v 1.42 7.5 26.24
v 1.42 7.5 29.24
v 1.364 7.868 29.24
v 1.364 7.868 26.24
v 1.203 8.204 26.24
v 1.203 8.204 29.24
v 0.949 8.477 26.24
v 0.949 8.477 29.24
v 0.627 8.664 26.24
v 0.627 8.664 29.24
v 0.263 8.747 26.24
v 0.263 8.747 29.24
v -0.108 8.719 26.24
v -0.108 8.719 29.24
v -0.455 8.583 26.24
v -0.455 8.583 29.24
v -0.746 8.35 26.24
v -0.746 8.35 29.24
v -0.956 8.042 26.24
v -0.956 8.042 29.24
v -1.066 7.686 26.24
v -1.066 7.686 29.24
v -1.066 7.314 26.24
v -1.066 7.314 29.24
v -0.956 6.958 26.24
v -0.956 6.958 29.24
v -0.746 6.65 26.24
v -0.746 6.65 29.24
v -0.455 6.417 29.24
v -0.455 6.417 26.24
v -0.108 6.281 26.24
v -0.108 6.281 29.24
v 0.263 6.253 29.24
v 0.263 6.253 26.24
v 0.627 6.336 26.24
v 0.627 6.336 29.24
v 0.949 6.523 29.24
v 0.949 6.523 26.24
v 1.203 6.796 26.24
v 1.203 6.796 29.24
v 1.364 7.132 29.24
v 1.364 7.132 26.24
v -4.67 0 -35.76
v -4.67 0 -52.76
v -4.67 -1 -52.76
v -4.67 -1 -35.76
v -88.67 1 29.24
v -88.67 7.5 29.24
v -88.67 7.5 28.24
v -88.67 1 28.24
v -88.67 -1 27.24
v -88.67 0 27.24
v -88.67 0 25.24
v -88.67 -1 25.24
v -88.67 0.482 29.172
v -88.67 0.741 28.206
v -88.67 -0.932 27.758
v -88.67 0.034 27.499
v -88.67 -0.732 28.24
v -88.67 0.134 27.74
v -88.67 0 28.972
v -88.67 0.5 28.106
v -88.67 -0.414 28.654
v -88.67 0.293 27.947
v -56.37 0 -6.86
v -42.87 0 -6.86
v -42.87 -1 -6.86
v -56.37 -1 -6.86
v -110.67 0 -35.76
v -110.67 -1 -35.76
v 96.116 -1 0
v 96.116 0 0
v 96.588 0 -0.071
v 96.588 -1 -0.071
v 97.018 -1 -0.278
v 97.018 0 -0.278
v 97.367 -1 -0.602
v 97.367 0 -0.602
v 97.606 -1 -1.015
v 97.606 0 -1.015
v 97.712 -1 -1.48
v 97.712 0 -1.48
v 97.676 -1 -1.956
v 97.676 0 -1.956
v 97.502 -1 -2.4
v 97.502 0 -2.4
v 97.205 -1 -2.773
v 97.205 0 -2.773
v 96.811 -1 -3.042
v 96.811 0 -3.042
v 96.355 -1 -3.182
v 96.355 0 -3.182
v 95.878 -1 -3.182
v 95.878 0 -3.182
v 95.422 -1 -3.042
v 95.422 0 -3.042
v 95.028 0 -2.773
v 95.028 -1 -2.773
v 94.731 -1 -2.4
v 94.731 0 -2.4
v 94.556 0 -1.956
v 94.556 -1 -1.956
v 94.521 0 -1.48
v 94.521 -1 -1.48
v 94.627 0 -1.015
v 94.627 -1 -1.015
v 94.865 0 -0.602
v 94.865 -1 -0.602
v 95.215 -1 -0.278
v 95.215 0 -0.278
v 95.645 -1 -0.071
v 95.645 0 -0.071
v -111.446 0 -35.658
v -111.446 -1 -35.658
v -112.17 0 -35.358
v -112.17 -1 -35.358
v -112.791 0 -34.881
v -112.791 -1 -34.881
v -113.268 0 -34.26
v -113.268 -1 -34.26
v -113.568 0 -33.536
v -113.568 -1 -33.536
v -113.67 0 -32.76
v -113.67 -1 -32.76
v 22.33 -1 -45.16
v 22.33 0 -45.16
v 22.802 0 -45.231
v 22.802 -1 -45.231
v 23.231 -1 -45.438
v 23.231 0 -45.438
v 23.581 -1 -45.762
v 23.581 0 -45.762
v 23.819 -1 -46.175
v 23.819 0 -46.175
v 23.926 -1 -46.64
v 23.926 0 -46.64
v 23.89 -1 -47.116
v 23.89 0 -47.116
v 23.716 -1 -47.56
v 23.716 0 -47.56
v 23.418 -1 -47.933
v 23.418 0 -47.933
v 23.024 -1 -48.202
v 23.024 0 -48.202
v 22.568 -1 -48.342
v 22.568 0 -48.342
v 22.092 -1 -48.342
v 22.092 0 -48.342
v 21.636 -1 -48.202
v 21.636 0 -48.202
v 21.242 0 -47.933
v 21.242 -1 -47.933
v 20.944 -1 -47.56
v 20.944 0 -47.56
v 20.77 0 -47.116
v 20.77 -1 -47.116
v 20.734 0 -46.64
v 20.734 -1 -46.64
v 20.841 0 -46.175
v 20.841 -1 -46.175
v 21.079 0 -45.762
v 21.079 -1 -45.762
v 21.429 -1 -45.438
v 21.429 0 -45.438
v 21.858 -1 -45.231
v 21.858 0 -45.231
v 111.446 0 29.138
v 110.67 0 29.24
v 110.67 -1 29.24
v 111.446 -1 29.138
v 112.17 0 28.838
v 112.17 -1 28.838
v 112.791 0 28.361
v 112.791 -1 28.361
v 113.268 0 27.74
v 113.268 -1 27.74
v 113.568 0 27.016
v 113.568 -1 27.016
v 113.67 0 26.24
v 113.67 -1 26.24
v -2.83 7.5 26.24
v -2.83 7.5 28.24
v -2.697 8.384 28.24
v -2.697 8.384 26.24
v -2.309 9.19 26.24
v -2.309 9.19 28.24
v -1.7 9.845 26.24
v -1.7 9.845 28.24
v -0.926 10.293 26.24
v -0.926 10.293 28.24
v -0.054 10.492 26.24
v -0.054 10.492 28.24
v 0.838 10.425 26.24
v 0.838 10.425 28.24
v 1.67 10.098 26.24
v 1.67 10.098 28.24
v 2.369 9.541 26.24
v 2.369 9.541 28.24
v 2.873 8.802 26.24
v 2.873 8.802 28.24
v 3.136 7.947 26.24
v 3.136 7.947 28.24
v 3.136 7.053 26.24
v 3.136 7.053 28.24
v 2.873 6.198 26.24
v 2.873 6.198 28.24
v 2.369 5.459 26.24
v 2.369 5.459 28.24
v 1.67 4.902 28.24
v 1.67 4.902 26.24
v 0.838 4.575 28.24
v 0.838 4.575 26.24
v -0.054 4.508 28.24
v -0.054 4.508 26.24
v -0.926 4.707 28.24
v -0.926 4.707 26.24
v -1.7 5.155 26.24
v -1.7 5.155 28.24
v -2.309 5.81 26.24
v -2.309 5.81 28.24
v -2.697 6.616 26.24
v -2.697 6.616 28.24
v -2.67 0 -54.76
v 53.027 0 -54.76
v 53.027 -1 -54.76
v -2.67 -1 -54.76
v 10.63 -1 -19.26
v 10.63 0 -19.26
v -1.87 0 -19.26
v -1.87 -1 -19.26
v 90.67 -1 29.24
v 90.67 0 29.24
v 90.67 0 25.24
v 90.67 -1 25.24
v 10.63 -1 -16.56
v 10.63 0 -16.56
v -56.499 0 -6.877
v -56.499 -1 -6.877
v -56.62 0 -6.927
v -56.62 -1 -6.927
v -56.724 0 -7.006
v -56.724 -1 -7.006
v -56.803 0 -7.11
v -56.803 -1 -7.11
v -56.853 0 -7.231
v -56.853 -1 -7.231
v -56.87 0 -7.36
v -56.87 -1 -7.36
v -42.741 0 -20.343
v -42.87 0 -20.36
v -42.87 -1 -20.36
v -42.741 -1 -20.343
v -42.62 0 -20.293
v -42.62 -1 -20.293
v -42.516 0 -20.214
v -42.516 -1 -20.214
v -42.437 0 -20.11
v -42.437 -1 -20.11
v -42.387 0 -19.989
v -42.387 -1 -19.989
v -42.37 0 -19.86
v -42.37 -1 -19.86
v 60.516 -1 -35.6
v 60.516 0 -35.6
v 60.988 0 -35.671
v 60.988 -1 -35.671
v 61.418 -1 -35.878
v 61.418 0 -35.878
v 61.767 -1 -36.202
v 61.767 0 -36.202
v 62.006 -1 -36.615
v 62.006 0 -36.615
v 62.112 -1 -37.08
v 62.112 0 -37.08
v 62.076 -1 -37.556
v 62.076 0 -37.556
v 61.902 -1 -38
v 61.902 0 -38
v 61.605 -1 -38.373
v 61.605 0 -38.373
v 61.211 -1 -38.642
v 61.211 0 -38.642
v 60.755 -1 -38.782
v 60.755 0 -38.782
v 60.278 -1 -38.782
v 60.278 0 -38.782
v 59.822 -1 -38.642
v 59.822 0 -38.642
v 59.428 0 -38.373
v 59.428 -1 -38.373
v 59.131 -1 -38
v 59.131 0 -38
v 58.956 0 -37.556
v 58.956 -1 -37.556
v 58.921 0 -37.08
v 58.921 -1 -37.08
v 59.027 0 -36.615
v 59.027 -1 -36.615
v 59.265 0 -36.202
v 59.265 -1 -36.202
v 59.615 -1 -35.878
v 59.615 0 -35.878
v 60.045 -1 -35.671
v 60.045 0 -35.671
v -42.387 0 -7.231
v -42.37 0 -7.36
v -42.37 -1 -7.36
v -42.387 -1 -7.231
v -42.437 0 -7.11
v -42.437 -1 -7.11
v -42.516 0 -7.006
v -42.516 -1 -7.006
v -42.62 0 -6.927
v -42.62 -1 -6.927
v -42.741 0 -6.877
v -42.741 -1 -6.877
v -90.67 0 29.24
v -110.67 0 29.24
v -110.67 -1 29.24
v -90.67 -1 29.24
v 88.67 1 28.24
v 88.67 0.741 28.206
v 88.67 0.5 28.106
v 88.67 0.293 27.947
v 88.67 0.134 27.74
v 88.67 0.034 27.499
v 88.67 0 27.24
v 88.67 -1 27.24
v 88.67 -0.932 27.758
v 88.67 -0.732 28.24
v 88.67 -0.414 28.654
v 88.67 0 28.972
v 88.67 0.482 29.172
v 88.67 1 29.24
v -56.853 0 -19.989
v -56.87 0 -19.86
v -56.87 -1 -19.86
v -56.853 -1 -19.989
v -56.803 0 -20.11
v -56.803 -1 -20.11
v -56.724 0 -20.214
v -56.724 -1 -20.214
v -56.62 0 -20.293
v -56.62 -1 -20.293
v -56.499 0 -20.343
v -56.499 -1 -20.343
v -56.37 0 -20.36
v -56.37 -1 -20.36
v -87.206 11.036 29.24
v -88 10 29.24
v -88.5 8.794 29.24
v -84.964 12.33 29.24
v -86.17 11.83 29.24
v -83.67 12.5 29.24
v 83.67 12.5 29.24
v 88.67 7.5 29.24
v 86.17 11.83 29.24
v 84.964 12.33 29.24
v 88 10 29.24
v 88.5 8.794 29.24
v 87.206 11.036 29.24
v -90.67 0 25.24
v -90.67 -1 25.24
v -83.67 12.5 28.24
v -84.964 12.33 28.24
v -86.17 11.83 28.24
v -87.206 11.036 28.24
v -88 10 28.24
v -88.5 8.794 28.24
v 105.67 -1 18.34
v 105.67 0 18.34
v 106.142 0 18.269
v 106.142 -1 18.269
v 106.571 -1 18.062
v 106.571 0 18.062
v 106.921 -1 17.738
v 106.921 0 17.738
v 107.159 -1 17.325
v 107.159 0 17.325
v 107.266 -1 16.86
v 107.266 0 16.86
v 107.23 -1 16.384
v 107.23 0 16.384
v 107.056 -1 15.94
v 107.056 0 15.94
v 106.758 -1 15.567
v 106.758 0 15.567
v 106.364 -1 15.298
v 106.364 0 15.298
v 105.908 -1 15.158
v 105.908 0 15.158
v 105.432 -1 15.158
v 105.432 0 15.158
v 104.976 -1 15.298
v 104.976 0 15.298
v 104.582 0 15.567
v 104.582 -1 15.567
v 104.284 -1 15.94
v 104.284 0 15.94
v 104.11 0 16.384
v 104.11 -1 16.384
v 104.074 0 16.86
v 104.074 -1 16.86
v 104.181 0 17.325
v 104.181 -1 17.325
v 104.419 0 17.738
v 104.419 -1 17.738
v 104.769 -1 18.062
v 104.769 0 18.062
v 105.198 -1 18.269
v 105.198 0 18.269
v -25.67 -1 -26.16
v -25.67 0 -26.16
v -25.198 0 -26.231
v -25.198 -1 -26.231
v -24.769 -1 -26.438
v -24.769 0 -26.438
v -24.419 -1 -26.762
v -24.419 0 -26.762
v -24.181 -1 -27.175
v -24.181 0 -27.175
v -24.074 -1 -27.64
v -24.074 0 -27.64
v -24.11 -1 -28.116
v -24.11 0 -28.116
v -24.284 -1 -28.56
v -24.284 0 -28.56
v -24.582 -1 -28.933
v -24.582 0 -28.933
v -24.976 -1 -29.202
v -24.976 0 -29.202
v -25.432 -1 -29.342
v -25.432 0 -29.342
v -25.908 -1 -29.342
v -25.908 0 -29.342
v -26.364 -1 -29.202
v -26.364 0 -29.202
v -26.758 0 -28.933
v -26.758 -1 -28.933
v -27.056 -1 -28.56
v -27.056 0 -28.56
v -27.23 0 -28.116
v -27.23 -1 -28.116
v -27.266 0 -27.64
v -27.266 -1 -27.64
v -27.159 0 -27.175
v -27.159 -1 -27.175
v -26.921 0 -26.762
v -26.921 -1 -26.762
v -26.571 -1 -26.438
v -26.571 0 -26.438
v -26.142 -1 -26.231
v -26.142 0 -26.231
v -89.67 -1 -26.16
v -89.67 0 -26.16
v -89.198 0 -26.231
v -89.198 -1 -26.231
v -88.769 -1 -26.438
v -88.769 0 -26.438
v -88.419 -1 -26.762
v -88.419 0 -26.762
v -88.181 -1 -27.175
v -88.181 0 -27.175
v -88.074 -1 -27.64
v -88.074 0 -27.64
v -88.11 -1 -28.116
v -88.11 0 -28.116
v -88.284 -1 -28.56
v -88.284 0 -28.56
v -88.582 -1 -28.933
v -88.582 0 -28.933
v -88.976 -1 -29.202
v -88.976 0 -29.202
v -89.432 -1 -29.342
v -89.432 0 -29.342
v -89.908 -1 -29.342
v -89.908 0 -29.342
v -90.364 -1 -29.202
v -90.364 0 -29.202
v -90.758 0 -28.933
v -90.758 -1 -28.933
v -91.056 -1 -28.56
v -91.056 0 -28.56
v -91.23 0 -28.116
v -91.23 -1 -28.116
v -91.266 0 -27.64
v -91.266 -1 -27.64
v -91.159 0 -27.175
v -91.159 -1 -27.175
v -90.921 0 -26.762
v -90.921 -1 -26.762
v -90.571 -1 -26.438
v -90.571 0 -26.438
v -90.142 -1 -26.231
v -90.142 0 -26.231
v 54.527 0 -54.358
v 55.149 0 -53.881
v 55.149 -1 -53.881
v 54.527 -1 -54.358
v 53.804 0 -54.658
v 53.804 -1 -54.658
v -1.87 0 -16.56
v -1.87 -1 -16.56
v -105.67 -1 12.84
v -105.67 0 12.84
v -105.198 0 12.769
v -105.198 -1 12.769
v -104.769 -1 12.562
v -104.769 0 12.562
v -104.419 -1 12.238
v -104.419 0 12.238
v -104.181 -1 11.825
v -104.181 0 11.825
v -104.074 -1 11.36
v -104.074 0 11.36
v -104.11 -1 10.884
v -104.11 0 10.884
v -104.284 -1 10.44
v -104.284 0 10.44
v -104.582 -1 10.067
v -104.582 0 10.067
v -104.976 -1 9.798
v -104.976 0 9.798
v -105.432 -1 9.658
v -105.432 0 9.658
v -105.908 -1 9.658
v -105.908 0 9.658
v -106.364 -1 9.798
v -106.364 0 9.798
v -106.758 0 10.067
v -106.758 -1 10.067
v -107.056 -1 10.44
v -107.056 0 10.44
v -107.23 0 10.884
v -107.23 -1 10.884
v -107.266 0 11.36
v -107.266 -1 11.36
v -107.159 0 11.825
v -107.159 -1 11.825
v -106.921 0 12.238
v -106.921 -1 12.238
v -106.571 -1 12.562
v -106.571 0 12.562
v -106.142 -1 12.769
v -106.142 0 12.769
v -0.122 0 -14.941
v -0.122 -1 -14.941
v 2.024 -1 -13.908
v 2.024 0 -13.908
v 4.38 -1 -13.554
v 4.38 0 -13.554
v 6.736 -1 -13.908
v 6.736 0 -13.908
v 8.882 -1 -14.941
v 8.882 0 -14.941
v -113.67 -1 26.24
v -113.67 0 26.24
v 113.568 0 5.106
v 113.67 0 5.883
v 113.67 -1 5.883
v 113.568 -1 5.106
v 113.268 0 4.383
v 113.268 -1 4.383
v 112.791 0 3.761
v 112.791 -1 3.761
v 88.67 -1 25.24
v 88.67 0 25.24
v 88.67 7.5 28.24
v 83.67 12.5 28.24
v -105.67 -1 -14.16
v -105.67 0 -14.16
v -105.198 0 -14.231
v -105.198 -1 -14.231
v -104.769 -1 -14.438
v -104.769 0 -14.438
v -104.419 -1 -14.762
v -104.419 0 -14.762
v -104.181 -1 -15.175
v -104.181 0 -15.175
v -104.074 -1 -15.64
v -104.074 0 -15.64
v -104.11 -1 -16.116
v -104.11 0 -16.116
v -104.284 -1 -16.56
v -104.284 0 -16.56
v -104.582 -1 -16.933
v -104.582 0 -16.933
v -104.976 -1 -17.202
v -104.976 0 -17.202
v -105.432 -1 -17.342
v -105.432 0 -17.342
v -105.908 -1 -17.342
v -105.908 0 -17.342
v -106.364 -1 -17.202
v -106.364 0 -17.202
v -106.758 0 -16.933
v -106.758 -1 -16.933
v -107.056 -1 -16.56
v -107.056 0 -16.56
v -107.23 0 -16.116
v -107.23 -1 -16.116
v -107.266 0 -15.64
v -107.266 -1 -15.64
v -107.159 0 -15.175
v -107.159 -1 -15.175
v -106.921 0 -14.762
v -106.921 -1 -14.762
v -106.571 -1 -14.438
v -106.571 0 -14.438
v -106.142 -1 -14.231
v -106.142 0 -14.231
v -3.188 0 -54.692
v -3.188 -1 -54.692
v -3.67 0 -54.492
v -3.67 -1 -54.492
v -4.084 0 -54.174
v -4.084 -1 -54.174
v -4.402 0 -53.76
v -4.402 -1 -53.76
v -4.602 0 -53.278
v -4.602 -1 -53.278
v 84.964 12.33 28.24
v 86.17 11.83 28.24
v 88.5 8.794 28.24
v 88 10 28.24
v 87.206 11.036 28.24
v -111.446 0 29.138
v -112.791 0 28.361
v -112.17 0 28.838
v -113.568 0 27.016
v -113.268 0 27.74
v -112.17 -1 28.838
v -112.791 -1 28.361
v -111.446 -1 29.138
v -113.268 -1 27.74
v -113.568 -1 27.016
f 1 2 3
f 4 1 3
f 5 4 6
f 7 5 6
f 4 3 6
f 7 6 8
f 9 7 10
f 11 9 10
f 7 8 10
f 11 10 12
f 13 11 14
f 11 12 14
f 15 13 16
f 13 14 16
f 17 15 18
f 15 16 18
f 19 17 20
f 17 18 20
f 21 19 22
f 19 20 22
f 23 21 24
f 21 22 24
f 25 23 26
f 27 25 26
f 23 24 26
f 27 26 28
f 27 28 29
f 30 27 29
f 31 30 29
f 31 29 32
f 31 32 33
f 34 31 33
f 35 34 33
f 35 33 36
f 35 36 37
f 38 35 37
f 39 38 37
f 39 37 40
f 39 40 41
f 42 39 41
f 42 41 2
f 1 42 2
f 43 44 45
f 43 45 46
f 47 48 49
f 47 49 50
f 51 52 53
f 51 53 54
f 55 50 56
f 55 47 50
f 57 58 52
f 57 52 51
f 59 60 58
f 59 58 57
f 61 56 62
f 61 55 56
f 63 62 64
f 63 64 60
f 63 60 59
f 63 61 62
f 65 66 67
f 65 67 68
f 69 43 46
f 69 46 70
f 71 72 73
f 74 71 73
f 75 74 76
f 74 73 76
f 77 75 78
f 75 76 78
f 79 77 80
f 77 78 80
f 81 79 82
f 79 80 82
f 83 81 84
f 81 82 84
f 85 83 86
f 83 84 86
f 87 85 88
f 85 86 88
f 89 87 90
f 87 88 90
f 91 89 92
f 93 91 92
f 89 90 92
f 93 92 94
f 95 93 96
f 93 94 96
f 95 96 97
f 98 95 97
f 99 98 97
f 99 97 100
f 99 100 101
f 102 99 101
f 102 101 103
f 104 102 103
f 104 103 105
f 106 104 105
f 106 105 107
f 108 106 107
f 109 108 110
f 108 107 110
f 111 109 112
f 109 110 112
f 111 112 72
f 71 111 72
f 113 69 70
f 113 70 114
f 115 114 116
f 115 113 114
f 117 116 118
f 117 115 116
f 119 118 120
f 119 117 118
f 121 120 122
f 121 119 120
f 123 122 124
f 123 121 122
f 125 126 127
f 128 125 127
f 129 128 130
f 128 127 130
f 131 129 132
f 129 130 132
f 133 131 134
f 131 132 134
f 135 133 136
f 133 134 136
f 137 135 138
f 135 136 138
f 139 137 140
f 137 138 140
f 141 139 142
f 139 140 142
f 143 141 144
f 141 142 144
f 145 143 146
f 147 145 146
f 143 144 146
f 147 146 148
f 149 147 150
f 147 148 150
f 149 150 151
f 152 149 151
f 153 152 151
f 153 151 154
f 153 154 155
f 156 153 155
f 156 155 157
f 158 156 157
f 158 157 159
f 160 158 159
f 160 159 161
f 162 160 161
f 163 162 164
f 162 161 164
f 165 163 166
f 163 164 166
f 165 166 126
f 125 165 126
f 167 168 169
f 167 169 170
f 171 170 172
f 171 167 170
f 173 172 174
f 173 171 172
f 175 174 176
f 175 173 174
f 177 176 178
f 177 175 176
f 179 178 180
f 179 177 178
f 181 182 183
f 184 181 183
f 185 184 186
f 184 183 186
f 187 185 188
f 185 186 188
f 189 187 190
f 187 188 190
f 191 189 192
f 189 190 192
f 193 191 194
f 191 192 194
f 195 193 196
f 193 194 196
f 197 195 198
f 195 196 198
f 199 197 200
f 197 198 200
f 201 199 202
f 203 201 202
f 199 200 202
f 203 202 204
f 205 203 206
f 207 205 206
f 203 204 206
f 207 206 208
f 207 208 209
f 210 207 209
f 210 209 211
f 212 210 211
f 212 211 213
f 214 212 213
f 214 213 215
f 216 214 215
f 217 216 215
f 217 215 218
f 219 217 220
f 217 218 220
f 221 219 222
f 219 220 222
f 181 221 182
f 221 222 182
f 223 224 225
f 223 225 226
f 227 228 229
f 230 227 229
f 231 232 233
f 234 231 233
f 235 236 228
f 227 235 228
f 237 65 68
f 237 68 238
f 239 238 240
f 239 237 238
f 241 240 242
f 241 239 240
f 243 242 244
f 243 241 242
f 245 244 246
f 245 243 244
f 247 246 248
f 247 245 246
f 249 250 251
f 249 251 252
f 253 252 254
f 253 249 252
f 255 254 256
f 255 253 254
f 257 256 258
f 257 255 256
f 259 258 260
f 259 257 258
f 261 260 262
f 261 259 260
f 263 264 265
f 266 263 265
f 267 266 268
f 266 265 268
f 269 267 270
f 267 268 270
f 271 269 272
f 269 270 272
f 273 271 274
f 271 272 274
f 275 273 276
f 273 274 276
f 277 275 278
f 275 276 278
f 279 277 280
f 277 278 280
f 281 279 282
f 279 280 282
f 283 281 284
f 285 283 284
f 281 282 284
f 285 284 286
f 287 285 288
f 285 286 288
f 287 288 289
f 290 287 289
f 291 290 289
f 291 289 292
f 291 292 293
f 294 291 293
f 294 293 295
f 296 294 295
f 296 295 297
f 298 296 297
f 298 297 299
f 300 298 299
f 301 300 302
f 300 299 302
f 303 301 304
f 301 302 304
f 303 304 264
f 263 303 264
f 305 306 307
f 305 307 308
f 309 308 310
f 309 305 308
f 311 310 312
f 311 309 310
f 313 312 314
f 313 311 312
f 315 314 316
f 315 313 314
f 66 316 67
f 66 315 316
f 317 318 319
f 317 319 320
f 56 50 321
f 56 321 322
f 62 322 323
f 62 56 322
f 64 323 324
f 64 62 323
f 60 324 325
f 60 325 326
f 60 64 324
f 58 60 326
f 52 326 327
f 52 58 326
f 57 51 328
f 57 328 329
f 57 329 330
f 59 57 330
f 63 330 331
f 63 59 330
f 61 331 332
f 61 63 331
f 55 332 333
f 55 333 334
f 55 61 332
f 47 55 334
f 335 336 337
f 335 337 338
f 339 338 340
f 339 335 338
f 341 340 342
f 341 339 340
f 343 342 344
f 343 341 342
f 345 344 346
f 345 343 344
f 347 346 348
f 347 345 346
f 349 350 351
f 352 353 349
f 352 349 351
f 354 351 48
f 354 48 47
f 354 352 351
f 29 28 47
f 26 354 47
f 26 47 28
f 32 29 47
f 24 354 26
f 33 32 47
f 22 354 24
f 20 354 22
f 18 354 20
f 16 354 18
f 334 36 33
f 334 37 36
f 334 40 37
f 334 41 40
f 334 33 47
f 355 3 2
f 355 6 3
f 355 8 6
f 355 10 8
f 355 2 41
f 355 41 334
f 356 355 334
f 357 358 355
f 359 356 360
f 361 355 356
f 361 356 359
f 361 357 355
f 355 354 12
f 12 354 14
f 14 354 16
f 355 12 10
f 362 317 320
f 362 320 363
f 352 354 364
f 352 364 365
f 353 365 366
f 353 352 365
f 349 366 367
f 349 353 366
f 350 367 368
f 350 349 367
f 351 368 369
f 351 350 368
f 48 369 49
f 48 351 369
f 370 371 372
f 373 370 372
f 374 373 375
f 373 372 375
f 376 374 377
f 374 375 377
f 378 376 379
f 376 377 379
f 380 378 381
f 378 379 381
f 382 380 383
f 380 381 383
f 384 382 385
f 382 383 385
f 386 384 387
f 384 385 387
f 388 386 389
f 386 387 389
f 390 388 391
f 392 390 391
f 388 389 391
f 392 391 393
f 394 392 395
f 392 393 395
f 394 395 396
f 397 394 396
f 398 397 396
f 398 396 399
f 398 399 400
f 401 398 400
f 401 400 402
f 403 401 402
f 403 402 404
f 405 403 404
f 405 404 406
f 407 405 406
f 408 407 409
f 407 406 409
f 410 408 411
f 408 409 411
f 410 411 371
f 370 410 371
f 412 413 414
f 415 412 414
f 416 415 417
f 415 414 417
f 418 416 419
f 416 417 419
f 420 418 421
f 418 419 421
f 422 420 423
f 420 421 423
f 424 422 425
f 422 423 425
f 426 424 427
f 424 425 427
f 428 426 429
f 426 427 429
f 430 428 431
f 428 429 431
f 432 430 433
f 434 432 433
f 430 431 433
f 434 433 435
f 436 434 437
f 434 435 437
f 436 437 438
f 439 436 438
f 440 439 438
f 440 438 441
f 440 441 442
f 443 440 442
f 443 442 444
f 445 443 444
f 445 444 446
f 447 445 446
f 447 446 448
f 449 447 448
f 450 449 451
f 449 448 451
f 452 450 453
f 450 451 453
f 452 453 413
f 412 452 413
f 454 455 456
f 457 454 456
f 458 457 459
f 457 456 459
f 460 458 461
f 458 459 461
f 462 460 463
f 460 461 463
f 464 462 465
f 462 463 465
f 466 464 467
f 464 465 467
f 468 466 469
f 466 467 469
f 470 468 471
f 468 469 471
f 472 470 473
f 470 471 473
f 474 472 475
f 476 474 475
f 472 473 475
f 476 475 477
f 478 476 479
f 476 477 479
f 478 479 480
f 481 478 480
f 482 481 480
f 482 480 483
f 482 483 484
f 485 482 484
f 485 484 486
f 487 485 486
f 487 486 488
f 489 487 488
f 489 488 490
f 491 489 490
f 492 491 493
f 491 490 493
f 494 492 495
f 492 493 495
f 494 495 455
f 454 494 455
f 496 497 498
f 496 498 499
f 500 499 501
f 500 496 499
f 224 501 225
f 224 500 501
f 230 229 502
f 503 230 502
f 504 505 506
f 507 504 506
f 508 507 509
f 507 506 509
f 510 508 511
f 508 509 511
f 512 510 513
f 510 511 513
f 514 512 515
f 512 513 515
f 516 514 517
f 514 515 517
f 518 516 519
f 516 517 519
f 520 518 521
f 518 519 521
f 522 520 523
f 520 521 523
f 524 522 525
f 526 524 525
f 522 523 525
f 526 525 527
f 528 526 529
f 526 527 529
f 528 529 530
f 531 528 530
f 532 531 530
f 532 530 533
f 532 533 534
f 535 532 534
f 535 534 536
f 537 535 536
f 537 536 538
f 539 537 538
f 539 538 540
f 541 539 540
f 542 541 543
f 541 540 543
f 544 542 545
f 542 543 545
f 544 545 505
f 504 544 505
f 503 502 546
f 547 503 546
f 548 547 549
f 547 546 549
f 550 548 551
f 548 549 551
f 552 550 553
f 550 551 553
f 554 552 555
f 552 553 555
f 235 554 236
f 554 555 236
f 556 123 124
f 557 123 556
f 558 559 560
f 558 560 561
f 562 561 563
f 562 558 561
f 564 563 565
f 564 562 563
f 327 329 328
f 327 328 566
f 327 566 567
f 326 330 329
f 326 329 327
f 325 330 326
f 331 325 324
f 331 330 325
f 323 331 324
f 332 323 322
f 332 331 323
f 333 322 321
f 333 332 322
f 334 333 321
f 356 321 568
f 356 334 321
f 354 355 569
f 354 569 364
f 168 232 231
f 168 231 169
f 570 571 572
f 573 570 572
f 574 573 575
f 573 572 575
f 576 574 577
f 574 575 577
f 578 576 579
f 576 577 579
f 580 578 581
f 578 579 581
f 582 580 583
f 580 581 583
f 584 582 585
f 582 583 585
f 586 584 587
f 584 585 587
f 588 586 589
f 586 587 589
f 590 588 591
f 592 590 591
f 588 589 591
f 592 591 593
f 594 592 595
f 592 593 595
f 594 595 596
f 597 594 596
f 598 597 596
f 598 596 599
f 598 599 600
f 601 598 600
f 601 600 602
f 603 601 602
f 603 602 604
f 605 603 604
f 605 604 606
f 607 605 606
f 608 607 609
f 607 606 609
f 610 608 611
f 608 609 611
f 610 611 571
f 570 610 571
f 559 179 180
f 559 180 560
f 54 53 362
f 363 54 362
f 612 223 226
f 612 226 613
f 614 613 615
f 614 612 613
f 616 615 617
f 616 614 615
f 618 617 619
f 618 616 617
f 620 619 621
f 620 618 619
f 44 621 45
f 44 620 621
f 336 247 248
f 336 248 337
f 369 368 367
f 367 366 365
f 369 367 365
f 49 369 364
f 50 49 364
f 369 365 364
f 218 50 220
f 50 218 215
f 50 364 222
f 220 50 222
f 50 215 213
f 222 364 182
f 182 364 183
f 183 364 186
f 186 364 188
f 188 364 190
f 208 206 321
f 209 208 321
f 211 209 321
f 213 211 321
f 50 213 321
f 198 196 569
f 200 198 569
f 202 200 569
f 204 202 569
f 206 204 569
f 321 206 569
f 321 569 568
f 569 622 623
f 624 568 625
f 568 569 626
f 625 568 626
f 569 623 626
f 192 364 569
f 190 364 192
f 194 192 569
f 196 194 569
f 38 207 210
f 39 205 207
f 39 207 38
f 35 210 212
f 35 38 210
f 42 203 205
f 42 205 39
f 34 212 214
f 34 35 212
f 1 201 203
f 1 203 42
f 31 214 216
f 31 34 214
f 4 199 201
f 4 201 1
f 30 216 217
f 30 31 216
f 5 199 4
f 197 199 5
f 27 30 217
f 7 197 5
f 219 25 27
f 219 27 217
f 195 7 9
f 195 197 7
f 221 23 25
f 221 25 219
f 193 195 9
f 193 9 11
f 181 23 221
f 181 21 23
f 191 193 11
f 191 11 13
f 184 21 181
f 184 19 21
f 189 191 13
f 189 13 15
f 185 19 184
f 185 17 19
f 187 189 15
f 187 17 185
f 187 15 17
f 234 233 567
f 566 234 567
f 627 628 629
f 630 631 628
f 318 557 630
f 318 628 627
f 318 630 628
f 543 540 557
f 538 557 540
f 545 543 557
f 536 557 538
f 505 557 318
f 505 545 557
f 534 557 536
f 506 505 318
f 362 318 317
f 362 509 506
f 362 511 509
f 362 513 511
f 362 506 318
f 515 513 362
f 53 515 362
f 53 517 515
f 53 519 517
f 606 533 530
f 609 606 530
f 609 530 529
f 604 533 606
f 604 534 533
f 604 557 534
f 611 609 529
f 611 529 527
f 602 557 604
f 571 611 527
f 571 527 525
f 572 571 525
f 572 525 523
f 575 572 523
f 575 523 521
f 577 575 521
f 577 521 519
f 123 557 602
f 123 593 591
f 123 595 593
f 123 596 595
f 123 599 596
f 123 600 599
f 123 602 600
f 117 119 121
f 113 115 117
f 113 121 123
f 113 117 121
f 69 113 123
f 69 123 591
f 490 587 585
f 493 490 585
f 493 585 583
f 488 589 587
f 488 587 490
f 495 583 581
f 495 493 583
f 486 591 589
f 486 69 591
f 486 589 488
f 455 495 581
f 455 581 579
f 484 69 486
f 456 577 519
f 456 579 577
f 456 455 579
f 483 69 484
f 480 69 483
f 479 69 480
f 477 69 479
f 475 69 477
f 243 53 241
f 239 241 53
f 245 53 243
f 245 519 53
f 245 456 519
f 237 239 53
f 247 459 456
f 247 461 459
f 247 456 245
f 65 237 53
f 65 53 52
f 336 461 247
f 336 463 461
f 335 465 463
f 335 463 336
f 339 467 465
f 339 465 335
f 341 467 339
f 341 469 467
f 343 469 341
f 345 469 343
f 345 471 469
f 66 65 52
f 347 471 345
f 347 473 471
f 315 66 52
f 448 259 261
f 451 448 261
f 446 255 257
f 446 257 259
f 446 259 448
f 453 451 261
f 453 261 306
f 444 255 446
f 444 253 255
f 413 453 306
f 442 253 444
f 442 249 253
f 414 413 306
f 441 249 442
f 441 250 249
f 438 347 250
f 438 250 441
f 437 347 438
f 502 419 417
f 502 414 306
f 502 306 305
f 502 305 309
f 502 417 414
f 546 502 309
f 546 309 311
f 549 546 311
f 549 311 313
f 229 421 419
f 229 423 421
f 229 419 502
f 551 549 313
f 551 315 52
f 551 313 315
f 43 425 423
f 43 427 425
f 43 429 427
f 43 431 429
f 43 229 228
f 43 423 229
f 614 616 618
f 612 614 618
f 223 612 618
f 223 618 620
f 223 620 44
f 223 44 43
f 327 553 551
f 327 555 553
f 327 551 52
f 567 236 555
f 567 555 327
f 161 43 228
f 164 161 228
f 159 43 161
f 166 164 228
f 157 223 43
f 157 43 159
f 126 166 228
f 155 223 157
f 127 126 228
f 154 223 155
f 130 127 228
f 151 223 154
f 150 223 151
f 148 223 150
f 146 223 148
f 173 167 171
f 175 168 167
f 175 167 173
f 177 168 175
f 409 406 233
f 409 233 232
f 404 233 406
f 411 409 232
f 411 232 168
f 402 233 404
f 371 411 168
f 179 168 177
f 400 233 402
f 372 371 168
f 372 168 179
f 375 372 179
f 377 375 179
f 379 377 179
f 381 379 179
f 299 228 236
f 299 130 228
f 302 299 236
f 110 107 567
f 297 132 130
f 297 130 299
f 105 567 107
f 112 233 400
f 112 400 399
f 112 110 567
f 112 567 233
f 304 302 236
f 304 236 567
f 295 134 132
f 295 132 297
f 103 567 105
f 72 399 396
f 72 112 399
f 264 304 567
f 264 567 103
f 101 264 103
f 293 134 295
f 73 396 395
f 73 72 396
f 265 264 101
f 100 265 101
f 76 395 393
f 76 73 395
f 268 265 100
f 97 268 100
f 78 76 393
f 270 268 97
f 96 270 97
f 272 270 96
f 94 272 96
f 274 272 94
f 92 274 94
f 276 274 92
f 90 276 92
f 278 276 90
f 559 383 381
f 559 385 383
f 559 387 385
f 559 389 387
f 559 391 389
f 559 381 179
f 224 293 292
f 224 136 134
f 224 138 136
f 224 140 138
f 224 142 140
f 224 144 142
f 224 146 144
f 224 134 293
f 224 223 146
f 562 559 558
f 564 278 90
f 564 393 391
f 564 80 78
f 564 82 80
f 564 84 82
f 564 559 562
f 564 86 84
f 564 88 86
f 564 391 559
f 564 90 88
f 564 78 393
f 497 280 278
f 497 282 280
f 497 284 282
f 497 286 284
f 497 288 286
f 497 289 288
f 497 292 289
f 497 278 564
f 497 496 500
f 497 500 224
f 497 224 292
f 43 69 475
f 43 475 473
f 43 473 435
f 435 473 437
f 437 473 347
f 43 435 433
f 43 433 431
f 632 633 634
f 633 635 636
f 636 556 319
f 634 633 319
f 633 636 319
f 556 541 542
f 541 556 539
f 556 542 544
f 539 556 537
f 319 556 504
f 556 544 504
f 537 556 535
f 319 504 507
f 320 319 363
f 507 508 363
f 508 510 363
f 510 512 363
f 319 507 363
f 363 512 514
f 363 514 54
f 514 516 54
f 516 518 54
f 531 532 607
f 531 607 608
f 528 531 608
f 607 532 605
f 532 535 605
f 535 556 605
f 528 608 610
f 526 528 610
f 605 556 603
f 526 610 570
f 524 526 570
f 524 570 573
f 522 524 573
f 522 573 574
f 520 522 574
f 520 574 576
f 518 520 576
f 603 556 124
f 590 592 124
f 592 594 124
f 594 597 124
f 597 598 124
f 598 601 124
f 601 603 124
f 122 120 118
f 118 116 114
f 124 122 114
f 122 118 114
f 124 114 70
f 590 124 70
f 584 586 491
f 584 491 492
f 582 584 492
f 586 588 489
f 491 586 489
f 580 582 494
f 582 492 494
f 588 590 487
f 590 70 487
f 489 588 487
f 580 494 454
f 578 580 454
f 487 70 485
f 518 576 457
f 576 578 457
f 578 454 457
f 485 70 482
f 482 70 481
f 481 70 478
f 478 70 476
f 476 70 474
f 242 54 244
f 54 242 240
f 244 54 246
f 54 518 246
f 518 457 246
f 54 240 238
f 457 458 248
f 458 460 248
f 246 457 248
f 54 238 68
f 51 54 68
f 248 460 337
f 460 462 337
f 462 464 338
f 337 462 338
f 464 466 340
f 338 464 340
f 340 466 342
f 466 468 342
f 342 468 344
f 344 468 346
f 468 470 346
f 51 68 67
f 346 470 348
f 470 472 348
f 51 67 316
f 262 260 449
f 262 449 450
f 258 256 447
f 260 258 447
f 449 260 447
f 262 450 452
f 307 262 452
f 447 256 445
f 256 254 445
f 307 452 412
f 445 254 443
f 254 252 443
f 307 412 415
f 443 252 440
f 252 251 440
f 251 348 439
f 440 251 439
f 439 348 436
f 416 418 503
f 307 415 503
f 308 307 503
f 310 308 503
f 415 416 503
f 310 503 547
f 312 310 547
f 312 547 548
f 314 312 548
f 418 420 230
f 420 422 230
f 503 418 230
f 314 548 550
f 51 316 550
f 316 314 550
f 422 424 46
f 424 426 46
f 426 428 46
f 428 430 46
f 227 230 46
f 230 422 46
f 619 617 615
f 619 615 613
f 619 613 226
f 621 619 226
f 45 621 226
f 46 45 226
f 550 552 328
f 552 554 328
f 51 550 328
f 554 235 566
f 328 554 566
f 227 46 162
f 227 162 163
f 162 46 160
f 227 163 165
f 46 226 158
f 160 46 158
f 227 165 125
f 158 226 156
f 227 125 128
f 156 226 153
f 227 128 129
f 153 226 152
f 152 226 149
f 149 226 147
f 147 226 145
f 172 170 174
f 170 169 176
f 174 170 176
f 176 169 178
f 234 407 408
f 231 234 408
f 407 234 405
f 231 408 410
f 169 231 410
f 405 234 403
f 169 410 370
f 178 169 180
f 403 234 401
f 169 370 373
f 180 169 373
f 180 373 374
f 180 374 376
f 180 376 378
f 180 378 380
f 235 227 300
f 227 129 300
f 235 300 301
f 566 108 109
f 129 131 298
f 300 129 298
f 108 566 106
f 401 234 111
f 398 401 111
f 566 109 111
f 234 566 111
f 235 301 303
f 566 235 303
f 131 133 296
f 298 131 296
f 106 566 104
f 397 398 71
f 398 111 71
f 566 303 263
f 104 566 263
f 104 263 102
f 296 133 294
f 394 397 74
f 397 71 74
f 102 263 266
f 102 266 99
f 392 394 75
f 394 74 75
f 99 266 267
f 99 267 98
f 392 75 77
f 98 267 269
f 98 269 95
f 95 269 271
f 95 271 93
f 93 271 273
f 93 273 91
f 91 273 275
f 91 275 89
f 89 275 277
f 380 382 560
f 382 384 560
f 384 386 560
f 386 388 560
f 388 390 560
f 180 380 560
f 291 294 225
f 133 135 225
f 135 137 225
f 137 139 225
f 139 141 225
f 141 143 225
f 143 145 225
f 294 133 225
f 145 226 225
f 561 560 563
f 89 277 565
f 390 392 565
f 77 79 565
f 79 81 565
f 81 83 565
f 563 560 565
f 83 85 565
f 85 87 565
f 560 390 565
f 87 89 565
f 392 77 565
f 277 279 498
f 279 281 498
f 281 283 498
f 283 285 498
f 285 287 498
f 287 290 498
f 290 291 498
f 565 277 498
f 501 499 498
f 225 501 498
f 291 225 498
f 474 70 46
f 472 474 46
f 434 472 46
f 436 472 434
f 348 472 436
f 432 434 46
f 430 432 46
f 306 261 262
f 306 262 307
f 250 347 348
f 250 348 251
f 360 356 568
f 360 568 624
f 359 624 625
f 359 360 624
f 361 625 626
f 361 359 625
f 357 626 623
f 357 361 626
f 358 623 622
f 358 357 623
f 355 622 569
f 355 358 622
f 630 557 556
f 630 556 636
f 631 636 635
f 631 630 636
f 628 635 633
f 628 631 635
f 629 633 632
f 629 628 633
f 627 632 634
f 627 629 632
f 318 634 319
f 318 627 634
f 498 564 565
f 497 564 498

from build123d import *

# Parameters (mm, degrees)
SKETCH_1_R                        = 1.6
SM_BASE_FLANGE_1_DEPTH            = 1
SM_EDGE_FLANGE_1_STRIP_W          = 6
SM_EDGE_FLANGE_1_STRIP_H          = 1
SM_EDGE_FLANGE_1_STRIP_CUT_DEPTH  = 177.34
SM_EDGE_FLANGE_1_RELIEF_W         = 8
SM_EDGE_FLANGE_1_RELIEF_H         = 2
SM_EDGE_FLANGE_1_RELIEF_CUT_DEPTH = 1
SM_EDGE_FLANGE_1_DEPTH            = 177.34
SM_EDGE_FLANGE_1_FLAT_DEPTH       = 1
SKETCH_5_R                        = 3
EXTRUDE_1_DEPTH                   = 2
HOLE_WIZARD_M3_1_D                = 2.5


# Sheet-metal steps are written as plain solids
with BuildPart() as part:
    # Sketch 1 → 基体-法兰1 (new body)
    with BuildSketch(Plane(origin=(0, 0, 0), x_dir=(1, 0, 0), z_dir=(0, 1, 0))):
        with BuildLine():
            Line((-113.67, 32.76), (-113.67, -26.24))
            ThreePointArc((-113.67, -26.24), (-112.791320344, -28.361320344), (-110.67, -29.24))
            Line((-110.67, -29.24), (110.67, -29.24))
            ThreePointArc((110.67, -29.24), (112.791320344, -28.361320344), (113.67, -26.24))
            Line((113.67, -26.24), (113.67, -5.882640687))
            ThreePointArc((113.67, -5.882640687), (113.441638598, -4.73459039), (112.791320344, -3.761320344))
            Line((112.791320344, -3.761320344), (55.148679656, 53.881320344))
            ThreePointArc((55.148679656, 53.881320344), (54.17540961, 54.531638598), (53.027359313, 54.76))
            Line((53.027359313, 54.76), (-2.67, 54.76))
            ThreePointArc((-2.67, 54.76), (-4.084213562, 54.174213562), (-4.67, 52.76))
            Line((-4.67, 52.76), (-4.67, 35.76))
            Line((-4.67, 35.76), (-110.67, 35.76))
            ThreePointArc((-110.67, 35.76), (-112.791320344, 34.881320344), (-113.67, 32.76))
        make_face()
        with Locations(Location((-105.67, -11.24, 0), (0, 0, 270))):
            Circle(SKETCH_1_R, mode=Mode.SUBTRACT)
        with Locations(Location((-105.67, 15.76, 0), (0, 0, 270))):
            Circle(SKETCH_1_R, mode=Mode.SUBTRACT)
        with Locations(Location((-89.67, 27.76, 0), (0, 0, 270))):
            Circle(SKETCH_1_R, mode=Mode.SUBTRACT)
        with Locations(Location((-25.67, 27.76, 0), (0, 0, 270))):
            Circle(SKETCH_1_R, mode=Mode.SUBTRACT)
        with Locations(Location((22.33, 46.76, 0), (0, 0, 270))):
            Circle(SKETCH_1_R, mode=Mode.SUBTRACT)
        with Locations(Location((60.516291501, 37.2, 0), (0, 0, 270))):
            Circle(SKETCH_1_R, mode=Mode.SUBTRACT)
        with Locations(Location((96.116291501, 1.6, 0), (0, 0, 270))):
            Circle(SKETCH_1_R, mode=Mode.SUBTRACT)
        with Locations(Location((105.67, -16.74, 0), (0, 0, 270))):
            Circle(SKETCH_1_R, mode=Mode.SUBTRACT)
        with BuildLine():
            Line((10.63, 19.26), (-1.87, 19.26))
            Line((-1.87, 19.26), (-1.87, 16.56))
            ThreePointArc((-1.87, 16.56), (4.38, 13.553746089), (10.63, 16.56))
            Line((10.63, 16.56), (10.63, 19.26))
        make_face(mode=Mode.SUBTRACT)
        with BuildLine():
            Line((-42.37, 19.86), (-42.37, 7.36))
            ThreePointArc((-42.37, 7.36), (-42.516446609, 7.006446609), (-42.87, 6.86))
            Line((-42.87, 6.86), (-56.37, 6.86))
            ThreePointArc((-56.37, 6.86), (-56.723553391, 7.006446609), (-56.87, 7.36))
            Line((-56.87, 7.36), (-56.87, 19.86))
            ThreePointArc((-56.87, 19.86), (-56.723553391, 20.213553391), (-56.37, 20.36))
            Line((-56.37, 20.36), (-42.87, 20.36))
            ThreePointArc((-42.87, 20.36), (-42.516446609, 20.213553391), (-42.37, 19.86))
        make_face(mode=Mode.SUBTRACT)
    extrude(amount=-SM_BASE_FLANGE_1_DEPTH)

    # 边线-法兰1 strip (across the edge) → 边线-法兰1 strip cut (cut)
    with BuildSketch(Plane(origin=(-88.67, 0, 29.24), x_dir=(0, 0, -1), z_dir=(1, 0, 0))):
        with Locations((-1, -0.5)):
            Rectangle(SM_EDGE_FLANGE_1_STRIP_W, SM_EDGE_FLANGE_1_STRIP_H)
    extrude(amount=SM_EDGE_FLANGE_1_STRIP_CUT_DEPTH, mode=Mode.SUBTRACT)

    # 边线-法兰1 relief (on the sheet) → 边线-法兰1 relief cut (cut)
    with BuildSketch(Plane(origin=(-88.67, 0, 27.24), x_dir=(0, 0, -1), z_dir=(0, 1, 0))):
        with Locations((-2, 1)):
            Rectangle(SM_EDGE_FLANGE_1_RELIEF_W, SM_EDGE_FLANGE_1_RELIEF_H)
        with Locations((-2, -178.34)):
            Rectangle(SM_EDGE_FLANGE_1_RELIEF_W, SM_EDGE_FLANGE_1_RELIEF_H)
    extrude(amount=-SM_EDGE_FLANGE_1_RELIEF_CUT_DEPTH, mode=Mode.SUBTRACT)

    # 边线-法兰1 bend section (across the edge) → 边线-法兰1 (add)
    with BuildSketch(Plane(origin=(-88.67, 0, 29.24), x_dir=(0, 0, -1), z_dir=(1, 0, 0))):
        with BuildLine():
            Line((0, 1), (1, 1))
            ThreePointArc((1, 1), (1.292893219, 0.292893219), (2, 0))
            Line((2, 0), (2, -1))
            ThreePointArc((2, -1), (0.585786438, -0.414213562), (0, 1))
        make_face()
    extrude(amount=SM_EDGE_FLANGE_1_DEPTH)

    # 边线-法兰1 profile (on flange) → 边线-法兰1 flat (add)
    with BuildSketch(Plane.XY.offset(29.24)):
        with BuildLine():
            Line((-88.67, 1), (88.67, 1))
            Line((88.67, 1), (88.67, 7.5))
            ThreePointArc((88.67, 7.5), (87.205533906, 11.035533906), (83.67, 12.5))
            Line((83.67, 12.5), (-83.67, 12.5))
            ThreePointArc((-83.67, 12.5), (-87.205533906, 11.035533906), (-88.67, 7.5))
            Line((-88.67, 7.5), (-88.67, 1))
        make_face()
    extrude(amount=-SM_EDGE_FLANGE_1_FLAT_DEPTH)

    # 草图5 → 凸台-拉伸1 (add)
    with BuildSketch(Plane(origin=(0, 0, 28.24), x_dir=(-1, 0, 0), z_dir=(0, 0, -1))):
        with Locations((-0.17, 7.5)):
            Circle(SKETCH_5_R)
    extrude(amount=EXTRUDE_1_DEPTH)

    # M3 螺纹孔1 (through all)
    with Locations(Plane(origin=(0, 0, 26.24), x_dir=(-1, 0, 0), z_dir=(0, 0, -1))):
        with Locations((-0.17, 7.5)):
            Hole(HOLE_WIZARD_M3_1_D / 2)


solid = part.part
